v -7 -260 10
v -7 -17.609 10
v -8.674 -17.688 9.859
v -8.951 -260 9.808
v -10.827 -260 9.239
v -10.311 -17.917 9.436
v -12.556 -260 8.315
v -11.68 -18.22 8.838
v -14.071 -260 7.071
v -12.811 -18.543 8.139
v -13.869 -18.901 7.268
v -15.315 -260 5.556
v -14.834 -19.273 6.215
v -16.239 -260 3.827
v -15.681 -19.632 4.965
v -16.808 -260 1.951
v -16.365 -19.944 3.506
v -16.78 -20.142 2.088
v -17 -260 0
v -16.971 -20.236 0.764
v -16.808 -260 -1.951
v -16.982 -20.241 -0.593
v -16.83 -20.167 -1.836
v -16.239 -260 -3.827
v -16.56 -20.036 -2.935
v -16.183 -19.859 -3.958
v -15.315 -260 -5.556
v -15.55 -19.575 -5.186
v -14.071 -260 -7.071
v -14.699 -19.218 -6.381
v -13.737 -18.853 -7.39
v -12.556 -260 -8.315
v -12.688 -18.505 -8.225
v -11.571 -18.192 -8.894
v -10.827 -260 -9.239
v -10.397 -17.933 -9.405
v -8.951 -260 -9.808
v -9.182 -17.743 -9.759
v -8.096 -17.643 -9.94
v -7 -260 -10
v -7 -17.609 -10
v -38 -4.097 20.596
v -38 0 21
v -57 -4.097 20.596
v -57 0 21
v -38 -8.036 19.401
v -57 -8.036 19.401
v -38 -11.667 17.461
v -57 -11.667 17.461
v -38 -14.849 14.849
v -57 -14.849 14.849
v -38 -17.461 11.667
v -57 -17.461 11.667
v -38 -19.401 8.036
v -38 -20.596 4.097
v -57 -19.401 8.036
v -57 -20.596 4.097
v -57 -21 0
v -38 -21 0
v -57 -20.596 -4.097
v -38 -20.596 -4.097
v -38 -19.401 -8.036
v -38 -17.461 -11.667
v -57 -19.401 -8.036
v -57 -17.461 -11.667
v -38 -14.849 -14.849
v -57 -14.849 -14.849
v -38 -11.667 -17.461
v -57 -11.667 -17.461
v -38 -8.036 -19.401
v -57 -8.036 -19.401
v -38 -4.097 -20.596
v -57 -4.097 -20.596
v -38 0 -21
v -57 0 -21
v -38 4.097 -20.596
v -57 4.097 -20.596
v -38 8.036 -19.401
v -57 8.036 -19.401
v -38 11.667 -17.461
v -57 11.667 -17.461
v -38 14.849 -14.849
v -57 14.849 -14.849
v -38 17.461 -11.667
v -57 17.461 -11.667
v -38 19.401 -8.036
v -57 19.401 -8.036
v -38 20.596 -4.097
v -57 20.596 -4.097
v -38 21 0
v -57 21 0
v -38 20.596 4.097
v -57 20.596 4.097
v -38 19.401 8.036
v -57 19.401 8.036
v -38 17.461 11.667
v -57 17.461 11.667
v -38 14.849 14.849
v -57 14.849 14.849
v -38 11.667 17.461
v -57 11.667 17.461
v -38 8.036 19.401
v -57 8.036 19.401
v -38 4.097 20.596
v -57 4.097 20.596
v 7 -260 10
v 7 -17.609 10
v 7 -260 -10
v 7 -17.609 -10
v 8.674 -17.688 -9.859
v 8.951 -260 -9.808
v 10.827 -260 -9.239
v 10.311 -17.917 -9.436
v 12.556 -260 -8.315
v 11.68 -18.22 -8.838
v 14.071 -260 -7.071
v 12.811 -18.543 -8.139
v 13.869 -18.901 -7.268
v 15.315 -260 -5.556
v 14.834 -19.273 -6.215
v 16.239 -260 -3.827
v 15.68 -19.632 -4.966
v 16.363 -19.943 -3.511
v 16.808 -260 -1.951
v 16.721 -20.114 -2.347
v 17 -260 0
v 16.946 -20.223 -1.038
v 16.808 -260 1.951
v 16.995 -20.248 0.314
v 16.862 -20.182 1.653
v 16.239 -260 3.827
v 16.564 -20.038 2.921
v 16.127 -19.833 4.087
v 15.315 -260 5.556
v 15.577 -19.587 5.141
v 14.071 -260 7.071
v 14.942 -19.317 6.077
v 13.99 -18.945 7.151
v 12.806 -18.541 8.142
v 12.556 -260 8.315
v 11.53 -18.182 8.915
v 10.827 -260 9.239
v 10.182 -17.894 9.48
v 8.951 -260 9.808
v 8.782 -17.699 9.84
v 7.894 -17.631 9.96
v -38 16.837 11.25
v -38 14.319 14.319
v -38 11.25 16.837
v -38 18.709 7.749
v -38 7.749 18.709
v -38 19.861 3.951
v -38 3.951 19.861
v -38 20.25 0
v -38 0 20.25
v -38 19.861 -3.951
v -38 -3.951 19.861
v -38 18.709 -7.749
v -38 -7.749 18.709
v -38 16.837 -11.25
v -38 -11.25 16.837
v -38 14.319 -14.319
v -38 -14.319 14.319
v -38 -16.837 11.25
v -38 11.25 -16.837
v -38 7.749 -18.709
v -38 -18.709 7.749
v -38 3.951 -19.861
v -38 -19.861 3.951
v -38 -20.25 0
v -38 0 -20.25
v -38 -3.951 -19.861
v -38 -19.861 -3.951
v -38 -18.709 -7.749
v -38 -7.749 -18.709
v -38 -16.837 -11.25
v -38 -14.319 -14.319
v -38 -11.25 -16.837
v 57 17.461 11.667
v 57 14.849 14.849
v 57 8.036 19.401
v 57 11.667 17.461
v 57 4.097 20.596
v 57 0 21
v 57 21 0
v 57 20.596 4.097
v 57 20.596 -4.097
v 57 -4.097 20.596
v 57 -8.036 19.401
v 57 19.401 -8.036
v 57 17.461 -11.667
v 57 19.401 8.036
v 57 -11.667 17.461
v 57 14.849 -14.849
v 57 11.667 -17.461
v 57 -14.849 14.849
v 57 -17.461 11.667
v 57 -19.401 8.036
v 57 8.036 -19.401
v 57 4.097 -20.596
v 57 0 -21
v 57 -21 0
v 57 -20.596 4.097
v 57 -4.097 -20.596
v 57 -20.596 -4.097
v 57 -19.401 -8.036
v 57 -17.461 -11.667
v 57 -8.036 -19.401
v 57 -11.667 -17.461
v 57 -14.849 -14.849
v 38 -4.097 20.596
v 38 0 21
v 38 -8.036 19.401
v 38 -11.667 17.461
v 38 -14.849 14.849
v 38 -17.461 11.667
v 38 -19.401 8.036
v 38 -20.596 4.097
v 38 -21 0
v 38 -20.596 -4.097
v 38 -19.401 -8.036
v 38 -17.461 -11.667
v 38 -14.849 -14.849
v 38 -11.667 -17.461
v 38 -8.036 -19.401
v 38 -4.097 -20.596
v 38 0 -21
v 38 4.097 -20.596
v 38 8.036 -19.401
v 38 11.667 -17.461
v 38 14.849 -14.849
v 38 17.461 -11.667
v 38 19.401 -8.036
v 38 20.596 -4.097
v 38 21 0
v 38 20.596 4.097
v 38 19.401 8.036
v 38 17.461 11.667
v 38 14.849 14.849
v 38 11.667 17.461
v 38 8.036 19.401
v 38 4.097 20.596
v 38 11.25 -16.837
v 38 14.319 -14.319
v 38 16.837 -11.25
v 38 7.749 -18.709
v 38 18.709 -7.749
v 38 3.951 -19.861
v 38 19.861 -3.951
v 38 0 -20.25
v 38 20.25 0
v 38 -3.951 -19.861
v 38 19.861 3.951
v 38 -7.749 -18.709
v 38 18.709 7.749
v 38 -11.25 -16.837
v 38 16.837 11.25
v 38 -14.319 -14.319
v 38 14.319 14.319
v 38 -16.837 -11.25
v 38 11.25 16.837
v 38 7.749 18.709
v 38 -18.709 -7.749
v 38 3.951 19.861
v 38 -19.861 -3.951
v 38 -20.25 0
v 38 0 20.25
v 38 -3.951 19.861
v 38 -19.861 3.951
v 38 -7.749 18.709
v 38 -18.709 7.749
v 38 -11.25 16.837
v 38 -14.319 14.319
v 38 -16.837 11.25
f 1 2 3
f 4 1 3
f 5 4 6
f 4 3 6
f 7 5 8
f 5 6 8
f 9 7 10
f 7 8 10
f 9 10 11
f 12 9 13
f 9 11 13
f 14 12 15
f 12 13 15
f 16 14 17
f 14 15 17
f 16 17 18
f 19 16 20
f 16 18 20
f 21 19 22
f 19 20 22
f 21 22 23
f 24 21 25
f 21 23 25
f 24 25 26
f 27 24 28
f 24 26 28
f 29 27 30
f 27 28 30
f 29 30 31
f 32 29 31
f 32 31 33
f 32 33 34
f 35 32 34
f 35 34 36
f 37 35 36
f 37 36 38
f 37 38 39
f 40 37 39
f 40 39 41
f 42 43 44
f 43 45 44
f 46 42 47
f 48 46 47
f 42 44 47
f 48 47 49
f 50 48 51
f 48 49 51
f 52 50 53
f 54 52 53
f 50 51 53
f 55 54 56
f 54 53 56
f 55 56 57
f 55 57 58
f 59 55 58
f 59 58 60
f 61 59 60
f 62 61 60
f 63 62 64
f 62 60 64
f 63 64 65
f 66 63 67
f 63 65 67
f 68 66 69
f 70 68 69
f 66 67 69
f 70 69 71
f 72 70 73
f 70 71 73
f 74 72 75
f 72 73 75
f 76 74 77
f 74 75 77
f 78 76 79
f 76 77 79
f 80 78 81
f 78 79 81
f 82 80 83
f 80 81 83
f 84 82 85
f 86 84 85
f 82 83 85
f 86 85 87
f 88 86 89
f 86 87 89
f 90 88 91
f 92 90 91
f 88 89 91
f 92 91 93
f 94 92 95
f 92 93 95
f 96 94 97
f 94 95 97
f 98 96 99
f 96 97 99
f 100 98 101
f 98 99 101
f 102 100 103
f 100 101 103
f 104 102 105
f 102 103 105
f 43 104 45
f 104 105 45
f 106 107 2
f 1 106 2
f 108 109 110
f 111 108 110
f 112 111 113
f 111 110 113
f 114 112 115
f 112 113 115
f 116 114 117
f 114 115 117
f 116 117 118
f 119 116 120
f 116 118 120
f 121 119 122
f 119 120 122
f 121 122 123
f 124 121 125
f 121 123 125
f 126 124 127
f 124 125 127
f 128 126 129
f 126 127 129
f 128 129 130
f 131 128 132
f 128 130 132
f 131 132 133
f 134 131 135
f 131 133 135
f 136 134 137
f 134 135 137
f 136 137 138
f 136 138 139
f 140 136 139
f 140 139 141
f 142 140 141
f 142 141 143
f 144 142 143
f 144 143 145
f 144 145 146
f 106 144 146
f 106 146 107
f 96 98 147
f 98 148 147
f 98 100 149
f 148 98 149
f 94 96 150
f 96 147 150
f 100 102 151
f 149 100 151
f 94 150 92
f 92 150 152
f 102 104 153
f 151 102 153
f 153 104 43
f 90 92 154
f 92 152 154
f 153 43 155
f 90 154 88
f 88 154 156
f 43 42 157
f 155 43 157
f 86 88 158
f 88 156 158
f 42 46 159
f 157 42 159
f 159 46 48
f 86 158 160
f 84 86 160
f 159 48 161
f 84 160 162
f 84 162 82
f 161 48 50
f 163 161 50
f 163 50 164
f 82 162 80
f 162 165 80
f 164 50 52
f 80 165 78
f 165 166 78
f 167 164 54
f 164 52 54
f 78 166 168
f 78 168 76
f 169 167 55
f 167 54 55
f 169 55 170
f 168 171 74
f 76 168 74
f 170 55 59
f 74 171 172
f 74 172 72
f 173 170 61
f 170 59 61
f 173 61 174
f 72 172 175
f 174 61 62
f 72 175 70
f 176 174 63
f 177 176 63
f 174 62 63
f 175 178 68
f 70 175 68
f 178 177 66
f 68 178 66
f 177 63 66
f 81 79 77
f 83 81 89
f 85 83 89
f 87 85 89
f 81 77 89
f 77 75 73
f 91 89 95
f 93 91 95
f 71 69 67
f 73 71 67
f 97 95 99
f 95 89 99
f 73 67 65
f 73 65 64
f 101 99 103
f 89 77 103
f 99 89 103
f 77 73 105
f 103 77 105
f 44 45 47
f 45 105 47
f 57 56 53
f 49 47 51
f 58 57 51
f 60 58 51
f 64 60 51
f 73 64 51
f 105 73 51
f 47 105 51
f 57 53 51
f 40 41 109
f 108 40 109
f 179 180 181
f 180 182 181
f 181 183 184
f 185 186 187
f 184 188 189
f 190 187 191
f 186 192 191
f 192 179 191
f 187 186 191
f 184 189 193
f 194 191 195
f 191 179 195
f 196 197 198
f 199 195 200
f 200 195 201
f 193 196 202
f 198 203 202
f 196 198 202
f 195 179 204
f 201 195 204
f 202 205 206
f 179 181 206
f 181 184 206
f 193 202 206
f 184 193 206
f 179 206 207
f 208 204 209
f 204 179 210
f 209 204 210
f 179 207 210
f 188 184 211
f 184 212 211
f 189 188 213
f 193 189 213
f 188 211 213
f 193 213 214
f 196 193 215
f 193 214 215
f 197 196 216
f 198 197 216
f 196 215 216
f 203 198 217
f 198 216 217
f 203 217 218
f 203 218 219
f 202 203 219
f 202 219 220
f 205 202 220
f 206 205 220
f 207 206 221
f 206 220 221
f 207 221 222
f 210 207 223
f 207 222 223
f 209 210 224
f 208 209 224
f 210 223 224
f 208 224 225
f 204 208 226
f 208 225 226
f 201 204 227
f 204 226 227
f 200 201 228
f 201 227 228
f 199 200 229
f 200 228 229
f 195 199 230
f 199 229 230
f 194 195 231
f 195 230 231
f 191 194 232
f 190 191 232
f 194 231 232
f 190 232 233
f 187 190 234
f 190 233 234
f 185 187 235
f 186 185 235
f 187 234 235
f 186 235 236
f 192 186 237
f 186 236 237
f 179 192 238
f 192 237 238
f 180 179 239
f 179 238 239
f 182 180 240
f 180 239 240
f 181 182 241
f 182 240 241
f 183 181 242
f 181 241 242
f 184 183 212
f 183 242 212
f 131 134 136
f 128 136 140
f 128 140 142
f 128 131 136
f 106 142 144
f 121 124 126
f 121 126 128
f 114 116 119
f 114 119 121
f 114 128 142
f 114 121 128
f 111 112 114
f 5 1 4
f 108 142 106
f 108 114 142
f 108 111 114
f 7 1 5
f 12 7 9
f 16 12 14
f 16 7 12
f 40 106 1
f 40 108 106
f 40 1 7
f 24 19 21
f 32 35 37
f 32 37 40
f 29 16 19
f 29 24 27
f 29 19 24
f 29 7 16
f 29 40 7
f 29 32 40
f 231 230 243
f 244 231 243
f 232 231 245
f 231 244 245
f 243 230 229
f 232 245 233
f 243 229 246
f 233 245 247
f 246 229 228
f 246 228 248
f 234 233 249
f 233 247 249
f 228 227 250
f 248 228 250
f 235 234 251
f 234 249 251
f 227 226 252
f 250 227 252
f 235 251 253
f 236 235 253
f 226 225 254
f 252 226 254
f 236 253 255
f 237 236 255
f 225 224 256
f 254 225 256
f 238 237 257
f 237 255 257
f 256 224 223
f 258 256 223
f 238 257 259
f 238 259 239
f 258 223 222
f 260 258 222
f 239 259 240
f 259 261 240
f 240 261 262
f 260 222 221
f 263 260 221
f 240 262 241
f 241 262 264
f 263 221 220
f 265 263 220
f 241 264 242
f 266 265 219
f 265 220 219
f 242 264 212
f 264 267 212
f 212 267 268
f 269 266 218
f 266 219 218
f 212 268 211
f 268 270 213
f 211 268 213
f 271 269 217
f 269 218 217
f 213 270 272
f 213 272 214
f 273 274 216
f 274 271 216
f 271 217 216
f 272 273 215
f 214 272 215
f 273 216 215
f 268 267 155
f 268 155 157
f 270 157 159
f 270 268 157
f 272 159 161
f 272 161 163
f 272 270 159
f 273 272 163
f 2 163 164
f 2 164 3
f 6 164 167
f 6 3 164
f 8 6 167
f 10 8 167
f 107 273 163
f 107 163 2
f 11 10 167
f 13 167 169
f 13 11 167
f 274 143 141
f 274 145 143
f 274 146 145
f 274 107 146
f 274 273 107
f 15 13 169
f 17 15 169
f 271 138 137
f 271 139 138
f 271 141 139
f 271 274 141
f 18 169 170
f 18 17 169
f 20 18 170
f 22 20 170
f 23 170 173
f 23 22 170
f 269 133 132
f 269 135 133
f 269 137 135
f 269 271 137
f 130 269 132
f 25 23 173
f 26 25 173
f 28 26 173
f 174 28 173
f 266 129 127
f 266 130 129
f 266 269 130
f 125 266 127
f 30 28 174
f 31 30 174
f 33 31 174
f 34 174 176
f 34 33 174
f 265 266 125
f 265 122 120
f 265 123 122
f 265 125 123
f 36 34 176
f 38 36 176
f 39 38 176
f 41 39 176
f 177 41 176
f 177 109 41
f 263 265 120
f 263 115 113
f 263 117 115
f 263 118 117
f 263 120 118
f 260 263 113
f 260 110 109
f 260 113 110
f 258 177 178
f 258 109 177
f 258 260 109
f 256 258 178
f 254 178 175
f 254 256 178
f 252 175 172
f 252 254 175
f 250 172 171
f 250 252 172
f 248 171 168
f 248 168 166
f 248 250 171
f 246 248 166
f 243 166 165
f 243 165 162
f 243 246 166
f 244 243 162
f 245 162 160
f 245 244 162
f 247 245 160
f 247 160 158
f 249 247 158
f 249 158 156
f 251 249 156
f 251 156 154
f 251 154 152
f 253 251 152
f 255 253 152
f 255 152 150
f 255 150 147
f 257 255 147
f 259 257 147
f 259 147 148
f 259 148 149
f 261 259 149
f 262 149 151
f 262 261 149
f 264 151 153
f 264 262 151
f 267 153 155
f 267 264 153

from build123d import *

# Parameters (mm, degrees)
SKIZZE1_W                       = 76
SKIZZE1_H                       = 20.25
AUFSATZ_LINEAR_AUSTRAGEN1_DEPTH = 260


with BuildPart() as part:
    # Skizze1 → Rotation1 (revolve)
    with BuildSketch(Plane.XY, mode=Mode.PRIVATE) as rotation1_sk:
        with Locations((0, 10.125)):
            Rectangle(SKIZZE1_W, SKIZZE1_H)
        Polygon((-57, 21), (-57, 0), (-38, 0), (-38, 20.25), (-38, 21), align=None)
        Polygon((38, 20.25), (38, 0), (57, 0), (57, 21), (38, 21), align=None)
    revolve(rotation1_sk.sketch.rotate(Axis((-67.247528095, 0, 0), (1, 0, 0)), 90), axis=Axis((-67.247528095, 0, 0), (1, 0, 0)))

    # Skizze2 → Aufsatz-Linear austragen1 (add)
    with BuildSketch(Plane(origin=(0, 0, 0), x_dir=(1, 0, 0), z_dir=(0, 1, 0))):
        with BuildLine():
            Line((-7, 10), (7, 10))
            ThreePointArc((7, 10), (17, 0), (7, -10))
            Line((7, -10), (-7, -10))
            ThreePointArc((-7, -10), (-17, 0), (-7, 10))
        make_face()
    extrude(amount=-AUFSATZ_LINEAR_AUSTRAGEN1_DEPTH)


solid = part.part
